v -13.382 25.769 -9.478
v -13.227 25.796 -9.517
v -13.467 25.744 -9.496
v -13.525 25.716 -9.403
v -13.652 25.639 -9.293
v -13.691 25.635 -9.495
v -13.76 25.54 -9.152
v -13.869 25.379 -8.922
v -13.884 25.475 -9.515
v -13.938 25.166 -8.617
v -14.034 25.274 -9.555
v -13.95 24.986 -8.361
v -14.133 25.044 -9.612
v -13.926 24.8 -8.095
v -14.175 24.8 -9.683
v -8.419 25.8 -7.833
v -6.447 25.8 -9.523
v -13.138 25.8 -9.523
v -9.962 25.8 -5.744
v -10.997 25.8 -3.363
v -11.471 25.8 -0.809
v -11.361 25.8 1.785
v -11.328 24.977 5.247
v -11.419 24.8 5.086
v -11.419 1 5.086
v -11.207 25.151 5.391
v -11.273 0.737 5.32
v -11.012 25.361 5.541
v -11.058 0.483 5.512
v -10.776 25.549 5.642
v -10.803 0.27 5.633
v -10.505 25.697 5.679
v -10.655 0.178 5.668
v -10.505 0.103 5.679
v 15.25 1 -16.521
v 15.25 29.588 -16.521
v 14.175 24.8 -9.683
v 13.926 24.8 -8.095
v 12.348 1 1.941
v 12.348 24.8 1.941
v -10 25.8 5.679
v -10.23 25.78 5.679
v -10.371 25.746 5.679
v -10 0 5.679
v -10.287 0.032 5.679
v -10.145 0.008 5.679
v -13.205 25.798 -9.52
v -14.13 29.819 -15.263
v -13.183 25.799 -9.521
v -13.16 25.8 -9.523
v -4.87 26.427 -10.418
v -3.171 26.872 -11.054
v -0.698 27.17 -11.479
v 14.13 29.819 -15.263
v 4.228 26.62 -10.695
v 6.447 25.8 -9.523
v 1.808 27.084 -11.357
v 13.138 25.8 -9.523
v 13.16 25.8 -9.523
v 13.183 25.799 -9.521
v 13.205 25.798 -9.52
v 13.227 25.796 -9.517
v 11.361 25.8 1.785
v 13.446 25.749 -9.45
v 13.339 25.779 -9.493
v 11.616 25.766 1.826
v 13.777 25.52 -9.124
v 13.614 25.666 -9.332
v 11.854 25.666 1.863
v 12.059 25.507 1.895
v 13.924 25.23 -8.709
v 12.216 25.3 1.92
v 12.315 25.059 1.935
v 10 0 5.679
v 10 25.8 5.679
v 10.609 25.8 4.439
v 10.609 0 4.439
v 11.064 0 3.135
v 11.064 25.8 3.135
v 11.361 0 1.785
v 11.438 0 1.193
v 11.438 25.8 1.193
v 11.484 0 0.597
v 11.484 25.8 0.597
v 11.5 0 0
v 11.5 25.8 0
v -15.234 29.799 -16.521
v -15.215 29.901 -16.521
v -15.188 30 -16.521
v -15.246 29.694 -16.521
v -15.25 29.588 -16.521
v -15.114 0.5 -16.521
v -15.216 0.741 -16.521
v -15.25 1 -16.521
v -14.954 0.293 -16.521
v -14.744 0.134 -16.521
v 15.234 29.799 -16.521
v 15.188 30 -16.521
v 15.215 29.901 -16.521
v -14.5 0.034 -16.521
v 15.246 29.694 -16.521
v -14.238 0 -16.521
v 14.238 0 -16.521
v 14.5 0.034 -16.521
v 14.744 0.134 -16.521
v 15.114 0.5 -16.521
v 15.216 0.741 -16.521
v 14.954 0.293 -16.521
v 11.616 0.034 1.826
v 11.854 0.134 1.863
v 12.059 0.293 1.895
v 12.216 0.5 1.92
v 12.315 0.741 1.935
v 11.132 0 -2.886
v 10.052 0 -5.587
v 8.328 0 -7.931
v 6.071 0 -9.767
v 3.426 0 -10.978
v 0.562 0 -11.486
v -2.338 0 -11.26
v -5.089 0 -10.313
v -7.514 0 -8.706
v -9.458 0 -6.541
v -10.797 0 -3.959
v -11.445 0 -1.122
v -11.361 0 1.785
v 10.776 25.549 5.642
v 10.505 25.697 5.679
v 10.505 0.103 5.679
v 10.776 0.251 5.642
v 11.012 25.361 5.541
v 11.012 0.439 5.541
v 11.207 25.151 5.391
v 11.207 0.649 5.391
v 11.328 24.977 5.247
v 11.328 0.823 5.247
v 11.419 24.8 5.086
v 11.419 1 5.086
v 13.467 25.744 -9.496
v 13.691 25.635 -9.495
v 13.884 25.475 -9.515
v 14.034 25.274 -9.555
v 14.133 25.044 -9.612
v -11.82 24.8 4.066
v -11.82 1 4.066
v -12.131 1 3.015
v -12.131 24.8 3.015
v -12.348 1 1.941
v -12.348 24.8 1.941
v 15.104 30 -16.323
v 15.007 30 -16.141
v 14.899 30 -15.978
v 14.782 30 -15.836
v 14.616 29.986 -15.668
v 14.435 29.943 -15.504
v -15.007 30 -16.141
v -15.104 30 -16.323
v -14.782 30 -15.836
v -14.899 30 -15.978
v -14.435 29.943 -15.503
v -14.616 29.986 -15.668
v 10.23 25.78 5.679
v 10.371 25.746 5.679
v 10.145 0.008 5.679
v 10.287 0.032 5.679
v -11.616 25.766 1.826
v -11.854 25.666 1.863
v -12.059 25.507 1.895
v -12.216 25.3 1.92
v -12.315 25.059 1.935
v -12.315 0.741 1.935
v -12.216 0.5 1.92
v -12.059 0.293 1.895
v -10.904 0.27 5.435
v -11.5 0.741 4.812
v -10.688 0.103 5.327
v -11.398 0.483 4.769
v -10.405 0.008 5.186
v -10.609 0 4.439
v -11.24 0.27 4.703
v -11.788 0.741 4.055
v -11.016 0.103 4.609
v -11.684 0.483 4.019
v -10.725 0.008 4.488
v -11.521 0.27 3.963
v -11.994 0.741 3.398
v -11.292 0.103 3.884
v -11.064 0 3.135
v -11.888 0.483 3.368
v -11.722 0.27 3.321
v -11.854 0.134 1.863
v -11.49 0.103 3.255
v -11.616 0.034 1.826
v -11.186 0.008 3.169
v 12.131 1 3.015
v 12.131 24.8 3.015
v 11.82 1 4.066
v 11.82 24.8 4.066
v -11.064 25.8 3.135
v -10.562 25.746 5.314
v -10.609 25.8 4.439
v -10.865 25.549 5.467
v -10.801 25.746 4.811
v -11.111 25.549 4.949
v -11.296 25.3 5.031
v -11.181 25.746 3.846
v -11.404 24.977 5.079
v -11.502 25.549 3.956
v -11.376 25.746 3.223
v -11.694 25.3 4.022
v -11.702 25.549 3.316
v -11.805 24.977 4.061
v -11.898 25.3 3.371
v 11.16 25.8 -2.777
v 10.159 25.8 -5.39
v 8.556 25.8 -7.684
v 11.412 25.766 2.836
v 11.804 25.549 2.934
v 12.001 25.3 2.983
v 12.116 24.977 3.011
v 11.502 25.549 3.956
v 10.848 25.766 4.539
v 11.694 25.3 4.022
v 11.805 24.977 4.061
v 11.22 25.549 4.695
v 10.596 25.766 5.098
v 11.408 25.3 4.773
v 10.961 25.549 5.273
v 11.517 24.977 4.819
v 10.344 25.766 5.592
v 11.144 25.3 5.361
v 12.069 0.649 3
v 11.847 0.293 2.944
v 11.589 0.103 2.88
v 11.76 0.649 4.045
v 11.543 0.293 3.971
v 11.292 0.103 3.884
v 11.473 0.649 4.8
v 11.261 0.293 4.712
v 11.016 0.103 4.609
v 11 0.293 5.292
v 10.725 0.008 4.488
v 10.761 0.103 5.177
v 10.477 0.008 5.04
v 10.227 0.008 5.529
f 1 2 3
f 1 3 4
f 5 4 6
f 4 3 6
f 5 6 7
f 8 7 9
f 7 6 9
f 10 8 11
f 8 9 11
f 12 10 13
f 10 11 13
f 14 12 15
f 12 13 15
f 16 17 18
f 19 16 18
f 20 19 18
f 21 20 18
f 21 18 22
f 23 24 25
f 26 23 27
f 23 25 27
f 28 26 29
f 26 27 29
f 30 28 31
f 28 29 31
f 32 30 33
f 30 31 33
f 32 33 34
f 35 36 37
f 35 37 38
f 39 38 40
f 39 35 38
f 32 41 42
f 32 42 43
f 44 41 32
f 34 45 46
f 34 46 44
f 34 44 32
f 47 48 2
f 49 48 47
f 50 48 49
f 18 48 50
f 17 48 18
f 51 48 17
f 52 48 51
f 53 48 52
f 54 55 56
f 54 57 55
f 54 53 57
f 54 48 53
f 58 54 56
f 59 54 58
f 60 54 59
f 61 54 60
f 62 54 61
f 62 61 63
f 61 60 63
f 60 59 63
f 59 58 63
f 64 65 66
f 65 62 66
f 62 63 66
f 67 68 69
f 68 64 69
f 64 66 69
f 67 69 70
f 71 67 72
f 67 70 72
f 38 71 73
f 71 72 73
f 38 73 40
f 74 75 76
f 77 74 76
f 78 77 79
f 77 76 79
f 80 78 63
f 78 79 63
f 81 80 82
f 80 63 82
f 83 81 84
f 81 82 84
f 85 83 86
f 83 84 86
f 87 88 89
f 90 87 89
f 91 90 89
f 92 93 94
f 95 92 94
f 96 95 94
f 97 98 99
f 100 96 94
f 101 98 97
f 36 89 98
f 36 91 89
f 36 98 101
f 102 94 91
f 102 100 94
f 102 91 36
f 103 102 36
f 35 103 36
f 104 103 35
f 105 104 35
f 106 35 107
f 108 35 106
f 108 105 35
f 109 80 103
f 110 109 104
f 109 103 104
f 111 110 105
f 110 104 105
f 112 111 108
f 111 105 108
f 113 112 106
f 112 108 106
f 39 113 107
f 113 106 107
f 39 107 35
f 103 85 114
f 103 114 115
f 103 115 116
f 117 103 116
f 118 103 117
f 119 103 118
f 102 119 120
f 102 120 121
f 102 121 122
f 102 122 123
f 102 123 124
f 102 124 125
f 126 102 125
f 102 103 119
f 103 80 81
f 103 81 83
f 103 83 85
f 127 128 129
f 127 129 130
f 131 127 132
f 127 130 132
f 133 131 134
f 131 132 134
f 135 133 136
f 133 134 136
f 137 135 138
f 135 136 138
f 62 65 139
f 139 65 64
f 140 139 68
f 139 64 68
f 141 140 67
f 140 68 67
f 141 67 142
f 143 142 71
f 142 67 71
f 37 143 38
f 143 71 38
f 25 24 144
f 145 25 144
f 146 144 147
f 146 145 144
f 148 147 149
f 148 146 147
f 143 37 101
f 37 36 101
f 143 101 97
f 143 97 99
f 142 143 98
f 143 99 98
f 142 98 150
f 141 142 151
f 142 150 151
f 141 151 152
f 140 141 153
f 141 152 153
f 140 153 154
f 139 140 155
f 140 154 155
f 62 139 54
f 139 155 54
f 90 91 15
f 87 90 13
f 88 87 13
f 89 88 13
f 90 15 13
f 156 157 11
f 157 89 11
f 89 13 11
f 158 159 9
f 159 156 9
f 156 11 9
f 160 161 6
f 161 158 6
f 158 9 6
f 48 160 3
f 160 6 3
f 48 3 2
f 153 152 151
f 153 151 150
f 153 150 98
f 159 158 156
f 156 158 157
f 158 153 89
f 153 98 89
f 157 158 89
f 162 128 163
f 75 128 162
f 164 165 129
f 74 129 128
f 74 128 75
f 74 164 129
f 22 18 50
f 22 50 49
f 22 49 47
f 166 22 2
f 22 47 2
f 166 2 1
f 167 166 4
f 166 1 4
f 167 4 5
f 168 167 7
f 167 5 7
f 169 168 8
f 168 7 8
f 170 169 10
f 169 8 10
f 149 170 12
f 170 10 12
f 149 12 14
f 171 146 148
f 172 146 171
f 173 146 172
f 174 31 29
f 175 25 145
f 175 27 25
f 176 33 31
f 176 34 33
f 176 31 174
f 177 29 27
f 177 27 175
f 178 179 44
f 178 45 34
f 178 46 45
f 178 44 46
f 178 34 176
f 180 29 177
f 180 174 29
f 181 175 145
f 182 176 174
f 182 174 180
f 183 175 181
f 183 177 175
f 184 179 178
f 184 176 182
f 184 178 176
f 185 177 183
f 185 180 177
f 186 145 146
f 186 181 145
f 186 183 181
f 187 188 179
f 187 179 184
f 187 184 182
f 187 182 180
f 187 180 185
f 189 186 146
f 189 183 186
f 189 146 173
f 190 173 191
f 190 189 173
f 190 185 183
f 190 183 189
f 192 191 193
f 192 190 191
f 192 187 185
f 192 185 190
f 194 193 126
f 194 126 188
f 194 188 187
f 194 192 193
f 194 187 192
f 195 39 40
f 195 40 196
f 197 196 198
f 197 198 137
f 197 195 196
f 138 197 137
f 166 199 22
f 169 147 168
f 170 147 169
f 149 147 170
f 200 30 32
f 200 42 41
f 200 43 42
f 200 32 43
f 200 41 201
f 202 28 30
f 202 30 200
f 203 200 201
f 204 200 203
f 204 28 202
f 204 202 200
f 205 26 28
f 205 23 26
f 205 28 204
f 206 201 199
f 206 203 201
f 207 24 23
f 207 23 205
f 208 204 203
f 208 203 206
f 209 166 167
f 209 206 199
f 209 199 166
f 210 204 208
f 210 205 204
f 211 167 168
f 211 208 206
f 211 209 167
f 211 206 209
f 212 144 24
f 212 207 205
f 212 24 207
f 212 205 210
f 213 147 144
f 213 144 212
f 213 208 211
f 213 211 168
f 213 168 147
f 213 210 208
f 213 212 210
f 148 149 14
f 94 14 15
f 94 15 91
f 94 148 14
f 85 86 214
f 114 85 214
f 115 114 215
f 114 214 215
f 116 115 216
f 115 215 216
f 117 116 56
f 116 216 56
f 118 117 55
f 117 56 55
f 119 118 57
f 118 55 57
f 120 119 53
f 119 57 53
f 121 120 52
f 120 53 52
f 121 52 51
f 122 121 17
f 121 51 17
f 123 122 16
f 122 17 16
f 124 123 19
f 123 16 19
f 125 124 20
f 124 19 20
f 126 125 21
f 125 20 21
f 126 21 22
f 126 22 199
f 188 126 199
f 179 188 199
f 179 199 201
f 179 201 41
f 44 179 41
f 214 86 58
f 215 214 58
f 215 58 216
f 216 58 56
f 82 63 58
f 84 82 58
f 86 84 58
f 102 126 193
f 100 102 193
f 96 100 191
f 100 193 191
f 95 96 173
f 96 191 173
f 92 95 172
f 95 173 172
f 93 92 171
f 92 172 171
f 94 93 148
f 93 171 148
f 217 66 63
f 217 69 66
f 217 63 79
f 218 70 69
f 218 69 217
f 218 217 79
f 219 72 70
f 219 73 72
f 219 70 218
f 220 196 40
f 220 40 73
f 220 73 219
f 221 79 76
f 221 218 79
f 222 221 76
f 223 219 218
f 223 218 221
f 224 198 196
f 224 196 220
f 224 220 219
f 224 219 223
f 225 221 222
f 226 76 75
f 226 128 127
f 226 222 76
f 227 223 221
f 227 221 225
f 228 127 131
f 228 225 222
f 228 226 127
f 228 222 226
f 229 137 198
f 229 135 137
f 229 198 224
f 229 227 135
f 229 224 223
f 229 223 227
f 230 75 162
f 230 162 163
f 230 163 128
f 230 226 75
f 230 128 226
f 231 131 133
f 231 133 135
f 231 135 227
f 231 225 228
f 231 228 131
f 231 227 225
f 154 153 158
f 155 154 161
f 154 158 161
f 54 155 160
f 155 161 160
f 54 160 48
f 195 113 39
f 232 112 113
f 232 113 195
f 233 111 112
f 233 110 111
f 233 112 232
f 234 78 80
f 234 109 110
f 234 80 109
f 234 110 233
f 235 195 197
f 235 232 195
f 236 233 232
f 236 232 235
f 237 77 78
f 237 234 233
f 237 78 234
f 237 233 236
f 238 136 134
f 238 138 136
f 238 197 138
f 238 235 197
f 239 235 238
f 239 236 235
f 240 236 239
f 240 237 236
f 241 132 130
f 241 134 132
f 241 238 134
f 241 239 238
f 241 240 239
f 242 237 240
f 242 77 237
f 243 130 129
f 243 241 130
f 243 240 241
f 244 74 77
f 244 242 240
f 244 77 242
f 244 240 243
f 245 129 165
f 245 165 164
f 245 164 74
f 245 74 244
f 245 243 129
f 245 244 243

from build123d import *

# Parameters (mm, degrees)
SALIENTE_EXTRUIR1_DEPTH = 30
CORTAR_EXTRUIR1_START   = -4.2
CORTAR_EXTRUIR1_DEPTH   = 4.2
CHAFL_N1_SIZE           = 4.201245229
CHAFL_N1_SIZE_2         = 6
CORTAR_EXTRUIR2_DEPTH   = 38.490118291
REDONDEO1_R             = 1


with BuildPart() as part:
    # Croquis1 → Saliente-Extruir1 (new body)
    with BuildSketch(Plane(origin=(0, 0, 0), x_dir=(1, 0, 0), z_dir=(0, 1, 0))):
        with BuildLine():
            Line((11.135528726, -5.678908346), (-11.135528726, -5.678908346))
            ThreePointArc((-11.135528726, -5.678908346), (-11.889802545, -3.857796709), (-12.348419657, -1.940755517))
            Line((-12.348419657, -1.940755517), (-15.25, 16.521091654))
            Line((-15.25, 16.521091654), (15.25, 16.521091654))
            Line((15.25, 16.521091654), (12.348419657, -1.940755517))
            ThreePointArc((12.348419657, -1.940755517), (11.889802545, -3.857796709), (11.135528726, -5.678908346))
        make_face()
    extrude(amount=SALIENTE_EXTRUIR1_DEPTH)

    # Croquis4 → Cortar-Extruir1 (cut)
    with BuildSketch(Plane(origin=(0, 30, 0), x_dir=(1, 0, 0), z_dir=(0, 1, 0)).offset(CORTAR_EXTRUIR1_START)):
        with BuildLine():
            Line((-14.14983585, 9.521091654), (14.14983585, 9.521091654))
            Line((14.14983585, 9.521091654), (12.348419657, -1.940755517))
            ThreePointArc((12.348419657, -1.940755517), (11.889802545, -3.857796709), (11.135528726, -5.678908346))
            Line((11.135528726, -5.678908346), (-11.135528726, -5.678908346))
            ThreePointArc((-11.135528726, -5.678908346), (-11.889802545, -3.857796709), (-12.348419657, -1.940755517))
            Line((-12.348419657, -1.940755517), (-14.14983585, 9.521091654))
        make_face()
    extrude(amount=CORTAR_EXTRUIR1_DEPTH, mode=Mode.SUBTRACT)

    # Chaflán1
    # the kernel refuses this chamfer: 6, 4.201245229 mm, written as the material it takes off along each edge
    with BuildSketch(Plane(origin=(-29.645149232, 30, -9.521091654), x_dir=(0, -0.9989750717851553, 0.04526373771402067), z_dir=(1, 0, 0))) as chafl_n1_piece_1_section:
        Polygon((CHAFL_N1_SIZE * 0.998975071847, CHAFL_N1_SIZE * 0.0452637377168), (-CHAFL_N1_SIZE_2 * 0.045263737714, CHAFL_N1_SIZE_2 * 0.998975071785), (0, 0), align=None)
    chafl_n1_piece_1 = extrude(amount=59.290298463, mode=Mode.PRIVATE)
    chafl_n1_piece_1 = split(chafl_n1_piece_1, bisect_by=Plane(origin=(0, 25.8, -11.524605635), z_dir=(0, 1, 0)), keep=Keep.TOP, mode=Mode.PRIVATE)
    add(chafl_n1_piece_1, mode=Mode.SUBTRACT)

    # Croquis5 → Cortar-Extruir2 (cut, through all)
    with BuildSketch(Plane(origin=(0, 30, 0), x_dir=(1, 0, 0), z_dir=(0, 1, 0))):
        with BuildLine():
            ThreePointArc((11.5, 0), (-2.936835031, 11.118677979), (-10, -5.678908346))
            Line((-10, -5.678908346), (10, -5.678908346))
            ThreePointArc((10, -5.678908346), (11.118677979, -2.936835031), (11.5, 0))
        make_face()
        with BuildLine():
            Line((10, -5.678908346), (-10, -5.678908346))
            ThreePointArc((-10, -5.678908346), (0, -11.5), (10, -5.678908346))
        make_face()
    extrude(amount=-CORTAR_EXTRUIR2_DEPTH, mode=Mode.SUBTRACT)

    # Redondeo1
    # the kernel refuses this fillet: 1 mm, written as the material it takes off along each edge
    with BuildSketch(Plane(origin=(11.135528726, 0, 5.678908346), x_dir=(0.43073600418276364, 0, -0.9024779746346534), z_dir=(0, 1, 0))) as redondeo1_piece_1:
        with BuildLine():
            CenterArc((0.630943784, 0.999654376), REDONDEO1_R, 205.514277886, 65.992163004)
            Line((-0.27153419, 0.568918372), (-0.28958375, 0.560303652))
            Line((-0.28958375, 0.560303652), (-0.018049559, -0.00861472))
            Line((-0.018049559, -0.00861472), (-0.000525786, -0.019993088))
            ThreePointArc((-0.000525786, -0.019993088), (0.328616554, -0.0243203), (0.657758895, -0.019993088))
            Line((0.657758895, -0.019993088), (0.657233109, 0))
        make_face()
    extrude(amount=25.8, mode=Mode.SUBTRACT)
    with BuildSketch(Plane(origin=(-11.135528726, 0, 5.678908346), x_dir=(-0.43073600418276736, 0, -0.9024779746346517), z_dir=(0, 1, 0))) as redondeo1_piece_2:
        with BuildLine():
            CenterArc((0.630943784, -0.999654376), REDONDEO1_R, 88.493559111, 65.992163004)
            Line((-0.27153419, -0.568918372), (-0.28958375, -0.560303652))
            Line((-0.28958375, -0.560303652), (-0.018049559, 0.00861472))
            Line((-0.018049559, 0.00861472), (-0.000525786, 0.019993088))
            ThreePointArc((-0.000525786, 0.019993088), (0.328616554, 0.0243203), (0.657758895, 0.019993088))
            Line((0.657758895, 0.019993088), (0.657233109, 0))
        make_face()
    extrude(amount=25.8, mode=Mode.SUBTRACT)
    with BuildSketch(Plane(origin=(-15.881080665, 30, -15.521091654), x_dir=(0, -0.573576436351271, 0.8191520442888343), z_dir=(1, 0, 0))) as redondeo1_piece_3_section:
        with BuildLine():
            CenterArc((REDONDEO1_R * 0.315298788879, REDONDEO1_R), REDONDEO1_R, 235, 35)
            Line((-REDONDEO1_R * 0.258277647472, REDONDEO1_R * 0.180847955711), (-REDONDEO1_R * 0.269749176199, REDONDEO1_R * 0.164464914825))
            Line((-REDONDEO1_R * 0.269749176199, REDONDEO1_R * 0.164464914825), (-REDONDEO1_R * 0.00630597577758, -REDONDEO1_R * 0.02))
            Line((-REDONDEO1_R * 0.00630597577758, -REDONDEO1_R * 0.02), (REDONDEO1_R * 0.315298788879, -REDONDEO1_R * 0.02))
            Line((REDONDEO1_R * 0.315298788879, -REDONDEO1_R * 0.02), (REDONDEO1_R * 0.315298788879, 0))
        make_face()
    redondeo1_piece_3 = extrude(amount=31.76216133, mode=Mode.PRIVATE)
    redondeo1_piece_3 = split(redondeo1_piece_3, bisect_by=Plane(origin=(14.730786778, 29.963938904, -13.217500501), z_dir=(-0.9878735725575741, 0, -0.1552604413311243)), keep=Keep.TOP, mode=Mode.PRIVATE)
    redondeo1_piece_3 = split(redondeo1_piece_3, bisect_by=Plane(origin=(-14.730786778, 29.963938904, -13.217500501), z_dir=(0.9878735725575741, 0, -0.1552604413311243)), keep=Keep.TOP, mode=Mode.PRIVATE)
    add(redondeo1_piece_3, mode=Mode.SUBTRACT)
    with BuildSketch(Plane(origin=(0, 0, 0), x_dir=(-0.7828247498801871, 0, 0.622242244608177), z_dir=(0.622242244608177, 0, 0.7828247498801871))) as redondeo1_piece_4_section:
        with BuildLine():
            CenterArc((12.5 - REDONDEO1_R, -REDONDEO1_R), REDONDEO1_R, 0, 90)
            Line((12.5, -REDONDEO1_R), (12.5 + REDONDEO1_R * 0.02, -REDONDEO1_R))
            Line((12.5 + REDONDEO1_R * 0.02, -REDONDEO1_R), (12.5 + REDONDEO1_R * 0.02, REDONDEO1_R * 0.02))
            Line((12.5 + REDONDEO1_R * 0.02, REDONDEO1_R * 0.02), (12.5 - REDONDEO1_R, REDONDEO1_R * 0.02))
            Line((12.5 - REDONDEO1_R, REDONDEO1_R * 0.02), (12.5 - REDONDEO1_R, 0))
        make_face()
    redondeo1_piece_4 = revolve(axis=Axis((0, 0, 0), (0, -1, 0)), revolution_arc=29.548159275, mode=Mode.PRIVATE)
    redondeo1_piece_4 = split(redondeo1_piece_4, bisect_by=Plane(origin=(-11.602574927, 0.225035128, 5.678908346), z_dir=(0, 0, -1)), keep=Keep.TOP, mode=Mode.PRIVATE)
    add(redondeo1_piece_4, mode=Mode.SUBTRACT)
    with BuildSketch(Plane(origin=(0, 25.8, 0), x_dir=(-0.7828247498801902, 0, 0.6222422446081731), z_dir=(0.6222422446081731, 0, 0.7828247498801902))) as redondeo1_piece_5_section:
        with BuildLine():
            CenterArc((12.5 - REDONDEO1_R, REDONDEO1_R), REDONDEO1_R, 270, 90)
            Line((12.5 - REDONDEO1_R, 0), (12.5 - REDONDEO1_R, -REDONDEO1_R * 0.02))
            Line((12.5 - REDONDEO1_R, -REDONDEO1_R * 0.02), (12.5 + REDONDEO1_R * 0.02, -REDONDEO1_R * 0.02))
            Line((12.5 + REDONDEO1_R * 0.02, -REDONDEO1_R * 0.02), (12.5 + REDONDEO1_R * 0.02, REDONDEO1_R))
            Line((12.5 + REDONDEO1_R * 0.02, REDONDEO1_R), (12.5, REDONDEO1_R))
        make_face()
    redondeo1_piece_5 = revolve(axis=Axis((0, 25.8, 0), (0, -1, 0)), revolution_arc=29.548159275, mode=Mode.PRIVATE)
    redondeo1_piece_5 = split(redondeo1_piece_5, bisect_by=Plane(origin=(-11.60257492, 25.57496487, 5.678908346), z_dir=(0, 0, -1)), keep=Keep.TOP, mode=Mode.PRIVATE)
    add(redondeo1_piece_5, mode=Mode.SUBTRACT)
    with BuildSketch(Plane(origin=(0, 0, 0), x_dir=(0.9878735725575738, 0, 0.1552604413311257), z_dir=(0.1552604413311257, 0, -0.9878735725575738))) as redondeo1_piece_6_section:
        with BuildLine():
            CenterArc((12.5 - REDONDEO1_R, -REDONDEO1_R), REDONDEO1_R, 0, 90)
            Line((12.5 - REDONDEO1_R, 0), (12.5 - REDONDEO1_R, REDONDEO1_R * 0.02))
            Line((12.5 - REDONDEO1_R, REDONDEO1_R * 0.02), (12.5 + REDONDEO1_R * 0.02, REDONDEO1_R * 0.02))
            Line((12.5 + REDONDEO1_R * 0.02, REDONDEO1_R * 0.02), (12.5 + REDONDEO1_R * 0.02, -REDONDEO1_R))
            Line((12.5 + REDONDEO1_R * 0.02, -REDONDEO1_R), (12.5, -REDONDEO1_R))
        make_face()
    redondeo1_piece_6 = revolve(axis=Axis((0, 0, 0), (0, -1, 0)), revolution_arc=29.548159275, mode=Mode.PRIVATE)
    redondeo1_piece_6 = split(redondeo1_piece_6, bisect_by=Plane(origin=(11.602574265, 0.22503504, 5.678908346), z_dir=(0, 0, -1)), keep=Keep.TOP, mode=Mode.PRIVATE)
    add(redondeo1_piece_6, mode=Mode.SUBTRACT)
    with BuildSketch(Plane(origin=(0, 25.8, 0), x_dir=(0.9878735725575738, 0, 0.155260441331126), z_dir=(0.155260441331126, 0, -0.9878735725575738))) as redondeo1_piece_7_section:
        with BuildLine():
            CenterArc((12.5 - REDONDEO1_R, REDONDEO1_R), REDONDEO1_R, 270, 90)
            Line((12.5 - REDONDEO1_R, 0), (12.5 - REDONDEO1_R, -REDONDEO1_R * 0.02))
            Line((12.5 - REDONDEO1_R, -REDONDEO1_R * 0.02), (12.5 + REDONDEO1_R * 0.02, -REDONDEO1_R * 0.02))
            Line((12.5 + REDONDEO1_R * 0.02, -REDONDEO1_R * 0.02), (12.5 + REDONDEO1_R * 0.02, REDONDEO1_R))
            Line((12.5 + REDONDEO1_R * 0.02, REDONDEO1_R), (12.5, REDONDEO1_R))
        make_face()
    redondeo1_piece_7 = revolve(axis=Axis((0, 25.8, 0), (0, -1, 0)), revolution_arc=29.548159275, mode=Mode.PRIVATE)
    redondeo1_piece_7 = split(redondeo1_piece_7, bisect_by=Plane(origin=(11.602574265, 25.57496496, 5.678908346), z_dir=(0, 0, -1)), keep=Keep.TOP, mode=Mode.PRIVATE)
    add(redondeo1_piece_7, mode=Mode.SUBTRACT)
    with BuildSketch(Plane(origin=(-12.348419657, 0, 1.940755517), x_dir=(0.987873572557574, 0, -0.15526044133112427), z_dir=(-0.1552604413311243, 0, -0.9878735725575741))) as redondeo1_piece_8_section:
        with BuildLine():
            CenterArc((REDONDEO1_R, -REDONDEO1_R), REDONDEO1_R, 90, 90)
            Line((0, -REDONDEO1_R), (-REDONDEO1_R * 0.02, -REDONDEO1_R))
            Line((-REDONDEO1_R * 0.02, -REDONDEO1_R), (-REDONDEO1_R * 0.02, REDONDEO1_R * 0.02))
            Line((-REDONDEO1_R * 0.02, REDONDEO1_R * 0.02), (REDONDEO1_R, REDONDEO1_R * 0.02))
            Line((REDONDEO1_R, REDONDEO1_R * 0.02), (REDONDEO1_R, 0))
        make_face()
    redondeo1_piece_8 = extrude(amount=21.188471565, mode=Mode.PRIVATE)
    redondeo1_piece_8 = split(redondeo1_piece_8, bisect_by=Plane(origin=(-13.573189498, 0.22662646, -16.521091654), z_dir=(0, 0, 1)), keep=Keep.TOP, mode=Mode.PRIVATE)
    add(redondeo1_piece_8, mode=Mode.SUBTRACT)
    with BuildSketch(Plane(origin=(-14.538266453, 25.8, -11.992553957), x_dir=(0, -1, 0), z_dir=(0.15526044133112413, 0, 0.9878735725575741))) as redondeo1_piece_9_section:
        with BuildLine():
            CenterArc((REDONDEO1_R, REDONDEO1_R), REDONDEO1_R, 180, 90)
            Line((0, REDONDEO1_R), (-REDONDEO1_R * 0.02, REDONDEO1_R))
            Line((-REDONDEO1_R * 0.02, REDONDEO1_R), (-REDONDEO1_R * 0.02, -REDONDEO1_R * 0.02))
            Line((-REDONDEO1_R * 0.02, -REDONDEO1_R * 0.02), (REDONDEO1_R, -REDONDEO1_R * 0.02))
            Line((REDONDEO1_R, -REDONDEO1_R * 0.02), (REDONDEO1_R, 0))
        make_face()
    redondeo1_piece_9 = extrude(amount=14.104344788, mode=Mode.PRIVATE)
    redondeo1_piece_9 = split(redondeo1_piece_9, bisect_by=Plane(origin=(-12.995193868, 22.9685698, -5.47916863), z_dir=(0, 0.8191520442888341, 0.5735764363512712)), keep=Keep.TOP, mode=Mode.PRIVATE)
    add(redondeo1_piece_9, mode=Mode.SUBTRACT)
    with BuildSketch(Plane(origin=(15.638151103, 0, -18.990775586), x_dir=(-0.987873572557574, 0, -0.1552604413311243), z_dir=(-0.1552604413311243, 0, 0.9878735725575741))) as redondeo1_piece_10_section:
        with BuildLine():
            CenterArc((REDONDEO1_R, -REDONDEO1_R), REDONDEO1_R, 90, 90)
            Line((0, -REDONDEO1_R), (-REDONDEO1_R * 0.02, -REDONDEO1_R))
            Line((-REDONDEO1_R * 0.02, -REDONDEO1_R), (-REDONDEO1_R * 0.02, REDONDEO1_R * 0.02))
            Line((-REDONDEO1_R * 0.02, REDONDEO1_R * 0.02), (REDONDEO1_R, REDONDEO1_R * 0.02))
            Line((REDONDEO1_R, REDONDEO1_R * 0.02), (REDONDEO1_R, 0))
        make_face()
    redondeo1_piece_10 = extrude(amount=21.188471565, mode=Mode.PRIVATE)
    redondeo1_piece_10 = split(redondeo1_piece_10, bisect_by=Plane(origin=(13.573189498, 0.22662646, -16.521091654), z_dir=(0, 0, 1)), keep=Keep.TOP, mode=Mode.PRIVATE)
    add(redondeo1_piece_10, mode=Mode.SUBTRACT)
    with BuildSketch(Plane(origin=(12.348419657, 25.8, 1.940755517), x_dir=(-0.987873572557574, 0, -0.15526044133112424), z_dir=(0.15526044133112424, 0, -0.9878735725575741))) as redondeo1_piece_11_section:
        with BuildLine():
            CenterArc((REDONDEO1_R, -REDONDEO1_R), REDONDEO1_R, 90, 90)
            Line((0, -REDONDEO1_R), (-REDONDEO1_R * 0.02, -REDONDEO1_R))
            Line((-REDONDEO1_R * 0.02, -REDONDEO1_R), (-REDONDEO1_R * 0.02, REDONDEO1_R * 0.02))
            Line((-REDONDEO1_R * 0.02, REDONDEO1_R * 0.02), (REDONDEO1_R, REDONDEO1_R * 0.02))
            Line((REDONDEO1_R, REDONDEO1_R * 0.02), (REDONDEO1_R, 0))
        make_face()
    redondeo1_piece_11 = extrude(amount=14.104344788, mode=Mode.PRIVATE)
    redondeo1_piece_11 = split(redondeo1_piece_11, bisect_by=Plane(origin=(12.995193868, 22.9685698, -5.47916863), z_dir=(0, 0.8191520442888341, 0.5735764363512712)), keep=Keep.TOP, mode=Mode.PRIVATE)
    add(redondeo1_piece_11, mode=Mode.SUBTRACT)
    with BuildSketch(Plane(origin=(-13.858160269, 24.499281341, -7.665251265), x_dir=(-0.08832475689359706, -0.8224196627964561, -0.5619827715913099), z_dir=(-0.1276892398051722, 0.5688812690234787, -0.8124466504283305))) as redondeo1_piece_12_section:
        with BuildLine():
            CenterArc((REDONDEO1_R * 0.91458005738, -REDONDEO1_R), REDONDEO1_R, 90, 84.890828744)
            Line((-REDONDEO1_R * 0.0814467660832, -REDONDEO1_R * 0.910946269355), (-REDONDEO1_R * 0.101367302552, -REDONDEO1_R * 0.909165194742))
            Line((-REDONDEO1_R * 0.101367302552, -REDONDEO1_R * 0.909165194742), (-REDONDEO1_R * 0.0182916011476, REDONDEO1_R * 0.02))
            Line((-REDONDEO1_R * 0.0182916011476, REDONDEO1_R * 0.02), (REDONDEO1_R * 0.91458005738, REDONDEO1_R * 0.02))
            Line((REDONDEO1_R * 0.91458005738, REDONDEO1_R * 0.02), (REDONDEO1_R * 0.91458005738, 0))
        make_face()
    redondeo1_piece_12 = extrude(amount=11.955811676, mode=Mode.PRIVATE)
    redondeo1_piece_12 = split(redondeo1_piece_12, bisect_by=Plane(origin=(-14.470678042, 30, -12.878094062), z_dir=(0, -1, 0)), keep=Keep.TOP, mode=Mode.PRIVATE)
    redondeo1_piece_12 = split(redondeo1_piece_12, bisect_by=Plane(origin=(-14.470678042, 25.8, -12.878094062), z_dir=(0, 1, 0)), keep=Keep.TOP, mode=Mode.PRIVATE)
    add(redondeo1_piece_12, mode=Mode.SUBTRACT)
    with BuildSketch(Plane(origin=(15.384788774, 31.300718659, -17.378710415), x_dir=(0.08832475689359764, -0.8224196627964561, -0.5619827715913099), z_dir=(-0.1276892398051722, -0.5688812690234787, 0.8124466504283305))) as redondeo1_piece_13_section:
        with BuildLine():
            CenterArc((REDONDEO1_R * 0.91458005738, -REDONDEO1_R), REDONDEO1_R, 90, 84.890828744)
            Line((-REDONDEO1_R * 0.0814467660832, -REDONDEO1_R * 0.910946269355), (-REDONDEO1_R * 0.101367302553, -REDONDEO1_R * 0.909165194742))
            Line((-REDONDEO1_R * 0.101367302553, -REDONDEO1_R * 0.909165194742), (-REDONDEO1_R * 0.0182916011476, REDONDEO1_R * 0.02))
            Line((-REDONDEO1_R * 0.0182916011476, REDONDEO1_R * 0.02), (REDONDEO1_R * 0.91458005738, REDONDEO1_R * 0.02))
            Line((REDONDEO1_R * 0.91458005738, REDONDEO1_R * 0.02), (REDONDEO1_R * 0.91458005738, 0))
        make_face()
    redondeo1_piece_13 = extrude(amount=11.955811676, mode=Mode.PRIVATE)
    redondeo1_piece_13 = split(redondeo1_piece_13, bisect_by=Plane(origin=(14.470678042, 25.8, -12.878094062), z_dir=(0, 1, 0)), keep=Keep.TOP, mode=Mode.PRIVATE)
    redondeo1_piece_13 = split(redondeo1_piece_13, bisect_by=Plane(origin=(14.470678042, 30, -12.878094062), z_dir=(0, -1, 0)), keep=Keep.TOP, mode=Mode.PRIVATE)
    add(redondeo1_piece_13, mode=Mode.SUBTRACT)
    with BuildSketch(Plane(origin=(0, 0, 0), x_dir=(0.9878735725575738, 0, 0.1552604413311257), z_dir=(0.1552604413311257, 0, -0.9878735725575738))) as redondeo1_piece_14a_section:
        with BuildLine():
            CenterArc((12.5 - REDONDEO1_R, -REDONDEO1_R), REDONDEO1_R, 0, 90)
            Line((12.5 - REDONDEO1_R, 0), (12.5 - REDONDEO1_R, REDONDEO1_R * 0.02))
            Line((12.5 - REDONDEO1_R, REDONDEO1_R * 0.02), (12.5 + REDONDEO1_R * 0.02, REDONDEO1_R * 0.02))
            Line((12.5 + REDONDEO1_R * 0.02, REDONDEO1_R * 0.02), (12.5 + REDONDEO1_R * 0.02, -REDONDEO1_R))
            Line((12.5 + REDONDEO1_R * 0.02, -REDONDEO1_R), (12.5, -REDONDEO1_R))
        make_face()
    redondeo1_piece_14a = revolve(axis=Axis((0, 0, 0), (0, -1, 0)), revolution_arc=29.548159275, mode=Mode.PRIVATE)
    redondeo1_piece_14a = split(redondeo1_piece_14a, bisect_by=Plane(origin=(10.289138435, 0.234770185, 5.678908346), z_dir=(0, 0, 1)), keep=Keep.TOP, mode=Mode.PRIVATE)
    with BuildSketch(Plane(origin=(11.135528726, -1.643082772, 5.678908346), x_dir=(0.43073600418275976, 0, -0.9024779746346553), z_dir=(0, 1, 0))) as redondeo1_piece_14b_section:
        with BuildLine():
            CenterArc((0.630943784, 0.999654376), REDONDEO1_R, 205.514277886, 65.992163004)
            Line((-0.27153419, 0.568918372), (-0.28958375, 0.560303652))
            Line((-0.28958375, 0.560303652), (-0.018049559, -0.00861472))
            Line((-0.018049559, -0.00861472), (-0.000525786, -0.019993088))
            ThreePointArc((-0.000525786, -0.019993088), (0.328616554, -0.0243203), (0.657758895, -0.019993088))
            Line((0.657758895, -0.019993088), (0.657233109, 0))
        make_face()
    redondeo1_piece_14b = extrude(amount=27.443082772, mode=Mode.PRIVATE)
    redondeo1_piece_14b = split(redondeo1_piece_14b, bisect_by=Plane(origin=(11.06383799, 0, 5.549435466), z_dir=(0, -1, 0)), keep=Keep.TOP, mode=Mode.PRIVATE)
    redondeo1_piece_14 = redondeo1_piece_14a & redondeo1_piece_14b
    add(redondeo1_piece_14, mode=Mode.SUBTRACT)
    with BuildSketch(Plane(origin=(11.135528726, 0, 5.678908346), x_dir=(0.43073600418276364, 0, -0.9024779746346534), z_dir=(0, 1, 0))) as redondeo1_piece_15a_section:
        with BuildLine():
            CenterArc((0.630943784, 0.999654376), REDONDEO1_R, 205.514277886, 65.992163004)
            Line((-0.27153419, 0.568918372), (-0.28958375, 0.560303652))
            Line((-0.28958375, 0.560303652), (-0.018049559, -0.00861472))
            Line((-0.018049559, -0.00861472), (-0.000525786, -0.019993088))
            ThreePointArc((-0.000525786, -0.019993088), (0.328616554, -0.0243203), (0.657758895, -0.019993088))
            Line((0.657758895, -0.019993088), (0.657233109, 0))
        make_face()
    redondeo1_piece_15a = extrude(amount=27.443082772, mode=Mode.PRIVATE)
    redondeo1_piece_15a = split(redondeo1_piece_15a, bisect_by=Plane(origin=(11.06383799, 25.8, 5.549435466), z_dir=(0, 1, 0)), keep=Keep.TOP, mode=Mode.PRIVATE)
    with BuildSketch(Plane(origin=(0, 25.8, 0), x_dir=(0.9878735725575738, 0, 0.155260441331126), z_dir=(0.155260441331126, 0, -0.9878735725575738))) as redondeo1_piece_15b_section:
        with BuildLine():
            CenterArc((12.5 - REDONDEO1_R, REDONDEO1_R), REDONDEO1_R, 270, 90)
            Line((12.5 - REDONDEO1_R, 0), (12.5 - REDONDEO1_R, -REDONDEO1_R * 0.02))
            Line((12.5 - REDONDEO1_R, -REDONDEO1_R * 0.02), (12.5 + REDONDEO1_R * 0.02, -REDONDEO1_R * 0.02))
            Line((12.5 + REDONDEO1_R * 0.02, -REDONDEO1_R * 0.02), (12.5 + REDONDEO1_R * 0.02, REDONDEO1_R))
            Line((12.5 + REDONDEO1_R * 0.02, REDONDEO1_R), (12.5, REDONDEO1_R))
        make_face()
    redondeo1_piece_15b = revolve(axis=Axis((0, 25.8, 0), (0, -1, 0)), revolution_arc=29.548159275, mode=Mode.PRIVATE)
    redondeo1_piece_15b = split(redondeo1_piece_15b, bisect_by=Plane(origin=(10.289138435, 25.565229815, 5.678908346), z_dir=(0, 0, 1)), keep=Keep.TOP, mode=Mode.PRIVATE)
    redondeo1_piece_15 = redondeo1_piece_15a & redondeo1_piece_15b
    add(redondeo1_piece_15, mode=Mode.SUBTRACT)
    with BuildSketch(Plane(origin=(0, 0, 0), x_dir=(-0.7828247498801871, 0, 0.622242244608177), z_dir=(0.622242244608177, 0, 0.7828247498801871))) as redondeo1_piece_16a_section:
        with BuildLine():
            CenterArc((12.5 - REDONDEO1_R, -REDONDEO1_R), REDONDEO1_R, 0, 90)
            Line((12.5, -REDONDEO1_R), (12.5 + REDONDEO1_R * 0.02, -REDONDEO1_R))
            Line((12.5 + REDONDEO1_R * 0.02, -REDONDEO1_R), (12.5 + REDONDEO1_R * 0.02, REDONDEO1_R * 0.02))
            Line((12.5 + REDONDEO1_R * 0.02, REDONDEO1_R * 0.02), (12.5 - REDONDEO1_R, REDONDEO1_R * 0.02))
            Line((12.5 - REDONDEO1_R, REDONDEO1_R * 0.02), (12.5 - REDONDEO1_R, 0))
        make_face()
    redondeo1_piece_16a = revolve(axis=Axis((0, 0, 0), (0, -1, 0)), revolution_arc=29.548159275, mode=Mode.PRIVATE)
    redondeo1_piece_16a = split(redondeo1_piece_16a, bisect_by=Plane(origin=(-10.289138153, 0.234770148, 5.678908346), z_dir=(0, 0, 1)), keep=Keep.TOP, mode=Mode.PRIVATE)
    with BuildSketch(Plane(origin=(-11.135528726, -1.643082772, 5.678908346), x_dir=(-0.43073600418276686, 0, -0.902477974634652), z_dir=(0, 1, 0))) as redondeo1_piece_16b_section:
        with BuildLine():
            CenterArc((0.630943784, -0.999654376), REDONDEO1_R, 88.493559111, 65.992163004)
            Line((-0.27153419, -0.568918372), (-0.28958375, -0.560303652))
            Line((-0.28958375, -0.560303652), (-0.018049559, 0.00861472))
            Line((-0.018049559, 0.00861472), (-0.000525786, 0.019993088))
            ThreePointArc((-0.000525786, 0.019993088), (0.328616554, 0.0243203), (0.657758895, 0.019993088))
            Line((0.657758895, 0.019993088), (0.657233109, 0))
        make_face()
    redondeo1_piece_16b = extrude(amount=27.443082772, mode=Mode.PRIVATE)
    redondeo1_piece_16b = split(redondeo1_piece_16b, bisect_by=Plane(origin=(-11.06383799, 0, 5.549435466), z_dir=(0, -1, 0)), keep=Keep.TOP, mode=Mode.PRIVATE)
    redondeo1_piece_16 = redondeo1_piece_16a & redondeo1_piece_16b
    add(redondeo1_piece_16, mode=Mode.SUBTRACT)
    with BuildSketch(Plane(origin=(0, 25.8, 0), x_dir=(-0.7828247498801902, 0, 0.6222422446081731), z_dir=(0.6222422446081731, 0, 0.7828247498801902))) as redondeo1_piece_17a_section:
        with BuildLine():
            CenterArc((12.5 - REDONDEO1_R, REDONDEO1_R), REDONDEO1_R, 270, 90)
            Line((12.5 - REDONDEO1_R, 0), (12.5 - REDONDEO1_R, -REDONDEO1_R * 0.02))
            Line((12.5 - REDONDEO1_R, -REDONDEO1_R * 0.02), (12.5 + REDONDEO1_R * 0.02, -REDONDEO1_R * 0.02))
            Line((12.5 + REDONDEO1_R * 0.02, -REDONDEO1_R * 0.02), (12.5 + REDONDEO1_R * 0.02, REDONDEO1_R))
            Line((12.5 + REDONDEO1_R * 0.02, REDONDEO1_R), (12.5, REDONDEO1_R))
        make_face()
    redondeo1_piece_17a = revolve(axis=Axis((0, 25.8, 0), (0, -1, 0)), revolution_arc=29.548159275, mode=Mode.PRIVATE)
    redondeo1_piece_17a = split(redondeo1_piece_17a, bisect_by=Plane(origin=(-10.289138154, 25.565229849, 5.678908346), z_dir=(0, 0, 1)), keep=Keep.TOP, mode=Mode.PRIVATE)
    with BuildSketch(Plane(origin=(-11.135528726, 0, 5.678908346), x_dir=(-0.43073600418276736, 0, -0.9024779746346517), z_dir=(0, 1, 0))) as redondeo1_piece_17b_section:
        with BuildLine():
            CenterArc((0.630943784, -0.999654376), REDONDEO1_R, 88.493559111, 65.992163004)
            Line((-0.27153419, -0.568918372), (-0.28958375, -0.560303652))
            Line((-0.28958375, -0.560303652), (-0.018049559, 0.00861472))
            Line((-0.018049559, 0.00861472), (-0.000525786, 0.019993088))
            ThreePointArc((-0.000525786, 0.019993088), (0.328616554, 0.0243203), (0.657758895, 0.019993088))
            Line((0.657758895, 0.019993088), (0.657233109, 0))
        make_face()
    redondeo1_piece_17b = extrude(amount=27.443082772, mode=Mode.PRIVATE)
    redondeo1_piece_17b = split(redondeo1_piece_17b, bisect_by=Plane(origin=(-11.06383799, 25.8, 5.549435466), z_dir=(0, 1, 0)), keep=Keep.TOP, mode=Mode.PRIVATE)
    redondeo1_piece_17 = redondeo1_piece_17a & redondeo1_piece_17b
    add(redondeo1_piece_17, mode=Mode.SUBTRACT)
    with BuildSketch(Plane(origin=(-13.858160269, 24.499281341, -7.665251265), x_dir=(-0.08832475689359706, -0.8224196627964561, -0.5619827715913099), z_dir=(-0.1276892398051722, 0.5688812690234787, -0.8124466504283305))) as redondeo1_piece_18a_section:
        with BuildLine():
            CenterArc((REDONDEO1_R * 0.91458005738, -REDONDEO1_R), REDONDEO1_R, 90, 84.890828744)
            Line((-REDONDEO1_R * 0.0814467660832, -REDONDEO1_R * 0.910946269355), (-REDONDEO1_R * 0.101367302552, -REDONDEO1_R * 0.909165194742))
            Line((-REDONDEO1_R * 0.101367302552, -REDONDEO1_R * 0.909165194742), (-REDONDEO1_R * 0.0182916011476, REDONDEO1_R * 0.02))
            Line((-REDONDEO1_R * 0.0182916011476, REDONDEO1_R * 0.02), (REDONDEO1_R * 0.91458005738, REDONDEO1_R * 0.02))
            Line((REDONDEO1_R * 0.91458005738, REDONDEO1_R * 0.02), (REDONDEO1_R * 0.91458005738, 0))
        make_face()
    redondeo1_piece_18a = extrude(amount=11.955811676, mode=Mode.PRIVATE)
    redondeo1_piece_18a = split(redondeo1_piece_18a, bisect_by=Plane(origin=(-15.046076432, 30, -16.662987381), z_dir=(0, 1, 0)), keep=Keep.TOP, mode=Mode.PRIVATE)
    with BuildSketch(Plane(origin=(-15.881080665, 30, -15.521091654), x_dir=(0, -0.573576436351271, 0.8191520442888343), z_dir=(1, 0, 0))) as redondeo1_piece_18b_section:
        with BuildLine():
            CenterArc((REDONDEO1_R * 0.315298788879, REDONDEO1_R), REDONDEO1_R, 235, 35)
            Line((-REDONDEO1_R * 0.258277647472, REDONDEO1_R * 0.180847955711), (-REDONDEO1_R * 0.269749176199, REDONDEO1_R * 0.164464914825))
            Line((-REDONDEO1_R * 0.269749176199, REDONDEO1_R * 0.164464914825), (-REDONDEO1_R * 0.00630597577758, -REDONDEO1_R * 0.02))
            Line((-REDONDEO1_R * 0.00630597577758, -REDONDEO1_R * 0.02), (REDONDEO1_R * 0.315298788879, -REDONDEO1_R * 0.02))
            Line((REDONDEO1_R * 0.315298788879, -REDONDEO1_R * 0.02), (REDONDEO1_R * 0.315298788879, 0))
        make_face()
    redondeo1_piece_18b = extrude(amount=31.76216133, mode=Mode.PRIVATE)
    redondeo1_piece_18b = split(redondeo1_piece_18b, bisect_by=Plane(origin=(-15.103499013, 29.962685486, -15.588951744), z_dir=(-0.9878735725575741, 0, 0.1552604413311243)), keep=Keep.TOP, mode=Mode.PRIVATE)
    redondeo1_piece_18 = redondeo1_piece_18a & redondeo1_piece_18b
    add(redondeo1_piece_18, mode=Mode.SUBTRACT)
    with BuildSketch(Plane(origin=(15.384788774, 31.300718659, -17.378710415), x_dir=(0.08832475689359764, -0.8224196627964561, -0.5619827715913099), z_dir=(-0.1276892398051722, -0.5688812690234787, 0.8124466504283305))) as redondeo1_piece_19a_section:
        with BuildLine():
            CenterArc((REDONDEO1_R * 0.91458005738, -REDONDEO1_R), REDONDEO1_R, 90, 84.890828744)
            Line((-REDONDEO1_R * 0.0814467660832, -REDONDEO1_R * 0.910946269355), (-REDONDEO1_R * 0.101367302553, -REDONDEO1_R * 0.909165194742))
            Line((-REDONDEO1_R * 0.101367302553, -REDONDEO1_R * 0.909165194742), (-REDONDEO1_R * 0.0182916011476, REDONDEO1_R * 0.02))
            Line((-REDONDEO1_R * 0.0182916011476, REDONDEO1_R * 0.02), (REDONDEO1_R * 0.91458005738, REDONDEO1_R * 0.02))
            Line((REDONDEO1_R * 0.91458005738, REDONDEO1_R * 0.02), (REDONDEO1_R * 0.91458005738, 0))
        make_face()
    redondeo1_piece_19a = extrude(amount=11.955811676, mode=Mode.PRIVATE)
    redondeo1_piece_19a = split(redondeo1_piece_19a, bisect_by=Plane(origin=(15.046076432, 30, -16.662987381), z_dir=(0, 1, 0)), keep=Keep.TOP, mode=Mode.PRIVATE)
    with BuildSketch(Plane(origin=(-15.881080665, 30, -15.521091654), x_dir=(0, -0.573576436351271, 0.8191520442888343), z_dir=(1, 0, 0))) as redondeo1_piece_19b_section:
        with BuildLine():
            CenterArc((REDONDEO1_R * 0.315298788879, REDONDEO1_R), REDONDEO1_R, 235, 35)
            Line((-REDONDEO1_R * 0.258277647472, REDONDEO1_R * 0.180847955711), (-REDONDEO1_R * 0.269749176199, REDONDEO1_R * 0.164464914825))
            Line((-REDONDEO1_R * 0.269749176199, REDONDEO1_R * 0.164464914825), (-REDONDEO1_R * 0.00630597577758, -REDONDEO1_R * 0.02))
            Line((-REDONDEO1_R * 0.00630597577758, -REDONDEO1_R * 0.02), (REDONDEO1_R * 0.315298788879, -REDONDEO1_R * 0.02))
            Line((REDONDEO1_R * 0.315298788879, -REDONDEO1_R * 0.02), (REDONDEO1_R * 0.315298788879, 0))
        make_face()
    redondeo1_piece_19b = extrude(amount=31.76216133, mode=Mode.PRIVATE)
    redondeo1_piece_19b = split(redondeo1_piece_19b, bisect_by=Plane(origin=(15.103499013, 29.962685486, -15.588951744), z_dir=(0.9878735725575741, 0, 0.1552604413311243)), keep=Keep.TOP, mode=Mode.PRIVATE)
    redondeo1_piece_19 = redondeo1_piece_19a & redondeo1_piece_19b
    add(redondeo1_piece_19, mode=Mode.SUBTRACT)
    with BuildSketch(Plane(origin=(-14.538266453, 25.8, -11.992553957), x_dir=(0, -1, 0), z_dir=(0.15526044133112413, 0, 0.9878735725575741))) as redondeo1_piece_20a_section:
        with BuildLine():
            CenterArc((REDONDEO1_R, REDONDEO1_R), REDONDEO1_R, 180, 90)
            Line((0, REDONDEO1_R), (-REDONDEO1_R * 0.02, REDONDEO1_R))
            Line((-REDONDEO1_R * 0.02, REDONDEO1_R), (-REDONDEO1_R * 0.02, -REDONDEO1_R * 0.02))
            Line((-REDONDEO1_R * 0.02, -REDONDEO1_R * 0.02), (REDONDEO1_R, -REDONDEO1_R * 0.02))
            Line((REDONDEO1_R, -REDONDEO1_R * 0.02), (REDONDEO1_R, 0))
        make_face()
    redondeo1_piece_20a = extrude(amount=14.104344788, mode=Mode.PRIVATE)
    redondeo1_piece_20a = split(redondeo1_piece_20a, bisect_by=Plane(origin=(-14.1012205, 26.222998713, -10.126974795), z_dir=(0, -0.8191520442888341, -0.5735764363512712)), keep=Keep.TOP, mode=Mode.PRIVATE)
    with BuildSketch(Plane(origin=(-13.858160269, 24.499281341, -7.665251265), x_dir=(-0.08832475689359706, -0.8224196627964561, -0.5619827715913099), z_dir=(-0.1276892398051722, 0.5688812690234787, -0.8124466504283305))) as redondeo1_piece_20b_section:
        with BuildLine():
            CenterArc((REDONDEO1_R * 0.91458005738, -REDONDEO1_R), REDONDEO1_R, 90, 84.890828744)
            Line((-REDONDEO1_R * 0.0814467660832, -REDONDEO1_R * 0.910946269355), (-REDONDEO1_R * 0.101367302552, -REDONDEO1_R * 0.909165194742))
            Line((-REDONDEO1_R * 0.101367302552, -REDONDEO1_R * 0.909165194742), (-REDONDEO1_R * 0.0182916011476, REDONDEO1_R * 0.02))
            Line((-REDONDEO1_R * 0.0182916011476, REDONDEO1_R * 0.02), (REDONDEO1_R * 0.91458005738, REDONDEO1_R * 0.02))
            Line((REDONDEO1_R * 0.91458005738, REDONDEO1_R * 0.02), (REDONDEO1_R * 0.91458005738, 0))
        make_face()
    redondeo1_piece_20b = extrude(amount=11.955811676, mode=Mode.PRIVATE)
    redondeo1_piece_20b = split(redondeo1_piece_20b, bisect_by=Plane(origin=(-13.85557718, 25.8, -8.86674541), z_dir=(0, -1, 0)), keep=Keep.TOP, mode=Mode.PRIVATE)
    redondeo1_piece_20 = redondeo1_piece_20a & redondeo1_piece_20b
    add(redondeo1_piece_20, mode=Mode.SUBTRACT)
    with BuildSketch(Plane(origin=(12.348419657, 25.8, 1.940755517), x_dir=(-0.987873572557574, 0, -0.15526044133112424), z_dir=(0.15526044133112424, 0, -0.9878735725575741))) as redondeo1_piece_21a_section:
        with BuildLine():
            CenterArc((REDONDEO1_R, -REDONDEO1_R), REDONDEO1_R, 90, 90)
            Line((0, -REDONDEO1_R), (-REDONDEO1_R * 0.02, -REDONDEO1_R))
            Line((-REDONDEO1_R * 0.02, -REDONDEO1_R), (-REDONDEO1_R * 0.02, REDONDEO1_R * 0.02))
            Line((-REDONDEO1_R * 0.02, REDONDEO1_R * 0.02), (REDONDEO1_R, REDONDEO1_R * 0.02))
            Line((REDONDEO1_R, REDONDEO1_R * 0.02), (REDONDEO1_R, 0))
        make_face()
    redondeo1_piece_21a = extrude(amount=14.104344788, mode=Mode.PRIVATE)
    redondeo1_piece_21a = split(redondeo1_piece_21a, bisect_by=Plane(origin=(14.1012205, 26.222998713, -10.126974795), z_dir=(0, -0.8191520442888341, -0.5735764363512712)), keep=Keep.TOP, mode=Mode.PRIVATE)
    with BuildSketch(Plane(origin=(15.384788774, 31.300718659, -17.378710415), x_dir=(0.08832475689359764, -0.8224196627964561, -0.5619827715913099), z_dir=(-0.1276892398051722, -0.5688812690234787, 0.8124466504283305))) as redondeo1_piece_21b_section:
        with BuildLine():
            CenterArc((REDONDEO1_R * 0.91458005738, -REDONDEO1_R), REDONDEO1_R, 90, 84.890828744)
            Line((-REDONDEO1_R * 0.0814467660832, -REDONDEO1_R * 0.910946269355), (-REDONDEO1_R * 0.101367302553, -REDONDEO1_R * 0.909165194742))
            Line((-REDONDEO1_R * 0.101367302553, -REDONDEO1_R * 0.909165194742), (-REDONDEO1_R * 0.0182916011476, REDONDEO1_R * 0.02))
            Line((-REDONDEO1_R * 0.0182916011476, REDONDEO1_R * 0.02), (REDONDEO1_R * 0.91458005738, REDONDEO1_R * 0.02))
            Line((REDONDEO1_R * 0.91458005738, REDONDEO1_R * 0.02), (REDONDEO1_R * 0.91458005738, 0))
        make_face()
    redondeo1_piece_21b = extrude(amount=11.955811676, mode=Mode.PRIVATE)
    redondeo1_piece_21b = split(redondeo1_piece_21b, bisect_by=Plane(origin=(13.85557718, 25.8, -8.86674541), z_dir=(0, -1, 0)), keep=Keep.TOP, mode=Mode.PRIVATE)
    redondeo1_piece_21 = redondeo1_piece_21a & redondeo1_piece_21b
    add(redondeo1_piece_21, mode=Mode.SUBTRACT)


solid = part.part
